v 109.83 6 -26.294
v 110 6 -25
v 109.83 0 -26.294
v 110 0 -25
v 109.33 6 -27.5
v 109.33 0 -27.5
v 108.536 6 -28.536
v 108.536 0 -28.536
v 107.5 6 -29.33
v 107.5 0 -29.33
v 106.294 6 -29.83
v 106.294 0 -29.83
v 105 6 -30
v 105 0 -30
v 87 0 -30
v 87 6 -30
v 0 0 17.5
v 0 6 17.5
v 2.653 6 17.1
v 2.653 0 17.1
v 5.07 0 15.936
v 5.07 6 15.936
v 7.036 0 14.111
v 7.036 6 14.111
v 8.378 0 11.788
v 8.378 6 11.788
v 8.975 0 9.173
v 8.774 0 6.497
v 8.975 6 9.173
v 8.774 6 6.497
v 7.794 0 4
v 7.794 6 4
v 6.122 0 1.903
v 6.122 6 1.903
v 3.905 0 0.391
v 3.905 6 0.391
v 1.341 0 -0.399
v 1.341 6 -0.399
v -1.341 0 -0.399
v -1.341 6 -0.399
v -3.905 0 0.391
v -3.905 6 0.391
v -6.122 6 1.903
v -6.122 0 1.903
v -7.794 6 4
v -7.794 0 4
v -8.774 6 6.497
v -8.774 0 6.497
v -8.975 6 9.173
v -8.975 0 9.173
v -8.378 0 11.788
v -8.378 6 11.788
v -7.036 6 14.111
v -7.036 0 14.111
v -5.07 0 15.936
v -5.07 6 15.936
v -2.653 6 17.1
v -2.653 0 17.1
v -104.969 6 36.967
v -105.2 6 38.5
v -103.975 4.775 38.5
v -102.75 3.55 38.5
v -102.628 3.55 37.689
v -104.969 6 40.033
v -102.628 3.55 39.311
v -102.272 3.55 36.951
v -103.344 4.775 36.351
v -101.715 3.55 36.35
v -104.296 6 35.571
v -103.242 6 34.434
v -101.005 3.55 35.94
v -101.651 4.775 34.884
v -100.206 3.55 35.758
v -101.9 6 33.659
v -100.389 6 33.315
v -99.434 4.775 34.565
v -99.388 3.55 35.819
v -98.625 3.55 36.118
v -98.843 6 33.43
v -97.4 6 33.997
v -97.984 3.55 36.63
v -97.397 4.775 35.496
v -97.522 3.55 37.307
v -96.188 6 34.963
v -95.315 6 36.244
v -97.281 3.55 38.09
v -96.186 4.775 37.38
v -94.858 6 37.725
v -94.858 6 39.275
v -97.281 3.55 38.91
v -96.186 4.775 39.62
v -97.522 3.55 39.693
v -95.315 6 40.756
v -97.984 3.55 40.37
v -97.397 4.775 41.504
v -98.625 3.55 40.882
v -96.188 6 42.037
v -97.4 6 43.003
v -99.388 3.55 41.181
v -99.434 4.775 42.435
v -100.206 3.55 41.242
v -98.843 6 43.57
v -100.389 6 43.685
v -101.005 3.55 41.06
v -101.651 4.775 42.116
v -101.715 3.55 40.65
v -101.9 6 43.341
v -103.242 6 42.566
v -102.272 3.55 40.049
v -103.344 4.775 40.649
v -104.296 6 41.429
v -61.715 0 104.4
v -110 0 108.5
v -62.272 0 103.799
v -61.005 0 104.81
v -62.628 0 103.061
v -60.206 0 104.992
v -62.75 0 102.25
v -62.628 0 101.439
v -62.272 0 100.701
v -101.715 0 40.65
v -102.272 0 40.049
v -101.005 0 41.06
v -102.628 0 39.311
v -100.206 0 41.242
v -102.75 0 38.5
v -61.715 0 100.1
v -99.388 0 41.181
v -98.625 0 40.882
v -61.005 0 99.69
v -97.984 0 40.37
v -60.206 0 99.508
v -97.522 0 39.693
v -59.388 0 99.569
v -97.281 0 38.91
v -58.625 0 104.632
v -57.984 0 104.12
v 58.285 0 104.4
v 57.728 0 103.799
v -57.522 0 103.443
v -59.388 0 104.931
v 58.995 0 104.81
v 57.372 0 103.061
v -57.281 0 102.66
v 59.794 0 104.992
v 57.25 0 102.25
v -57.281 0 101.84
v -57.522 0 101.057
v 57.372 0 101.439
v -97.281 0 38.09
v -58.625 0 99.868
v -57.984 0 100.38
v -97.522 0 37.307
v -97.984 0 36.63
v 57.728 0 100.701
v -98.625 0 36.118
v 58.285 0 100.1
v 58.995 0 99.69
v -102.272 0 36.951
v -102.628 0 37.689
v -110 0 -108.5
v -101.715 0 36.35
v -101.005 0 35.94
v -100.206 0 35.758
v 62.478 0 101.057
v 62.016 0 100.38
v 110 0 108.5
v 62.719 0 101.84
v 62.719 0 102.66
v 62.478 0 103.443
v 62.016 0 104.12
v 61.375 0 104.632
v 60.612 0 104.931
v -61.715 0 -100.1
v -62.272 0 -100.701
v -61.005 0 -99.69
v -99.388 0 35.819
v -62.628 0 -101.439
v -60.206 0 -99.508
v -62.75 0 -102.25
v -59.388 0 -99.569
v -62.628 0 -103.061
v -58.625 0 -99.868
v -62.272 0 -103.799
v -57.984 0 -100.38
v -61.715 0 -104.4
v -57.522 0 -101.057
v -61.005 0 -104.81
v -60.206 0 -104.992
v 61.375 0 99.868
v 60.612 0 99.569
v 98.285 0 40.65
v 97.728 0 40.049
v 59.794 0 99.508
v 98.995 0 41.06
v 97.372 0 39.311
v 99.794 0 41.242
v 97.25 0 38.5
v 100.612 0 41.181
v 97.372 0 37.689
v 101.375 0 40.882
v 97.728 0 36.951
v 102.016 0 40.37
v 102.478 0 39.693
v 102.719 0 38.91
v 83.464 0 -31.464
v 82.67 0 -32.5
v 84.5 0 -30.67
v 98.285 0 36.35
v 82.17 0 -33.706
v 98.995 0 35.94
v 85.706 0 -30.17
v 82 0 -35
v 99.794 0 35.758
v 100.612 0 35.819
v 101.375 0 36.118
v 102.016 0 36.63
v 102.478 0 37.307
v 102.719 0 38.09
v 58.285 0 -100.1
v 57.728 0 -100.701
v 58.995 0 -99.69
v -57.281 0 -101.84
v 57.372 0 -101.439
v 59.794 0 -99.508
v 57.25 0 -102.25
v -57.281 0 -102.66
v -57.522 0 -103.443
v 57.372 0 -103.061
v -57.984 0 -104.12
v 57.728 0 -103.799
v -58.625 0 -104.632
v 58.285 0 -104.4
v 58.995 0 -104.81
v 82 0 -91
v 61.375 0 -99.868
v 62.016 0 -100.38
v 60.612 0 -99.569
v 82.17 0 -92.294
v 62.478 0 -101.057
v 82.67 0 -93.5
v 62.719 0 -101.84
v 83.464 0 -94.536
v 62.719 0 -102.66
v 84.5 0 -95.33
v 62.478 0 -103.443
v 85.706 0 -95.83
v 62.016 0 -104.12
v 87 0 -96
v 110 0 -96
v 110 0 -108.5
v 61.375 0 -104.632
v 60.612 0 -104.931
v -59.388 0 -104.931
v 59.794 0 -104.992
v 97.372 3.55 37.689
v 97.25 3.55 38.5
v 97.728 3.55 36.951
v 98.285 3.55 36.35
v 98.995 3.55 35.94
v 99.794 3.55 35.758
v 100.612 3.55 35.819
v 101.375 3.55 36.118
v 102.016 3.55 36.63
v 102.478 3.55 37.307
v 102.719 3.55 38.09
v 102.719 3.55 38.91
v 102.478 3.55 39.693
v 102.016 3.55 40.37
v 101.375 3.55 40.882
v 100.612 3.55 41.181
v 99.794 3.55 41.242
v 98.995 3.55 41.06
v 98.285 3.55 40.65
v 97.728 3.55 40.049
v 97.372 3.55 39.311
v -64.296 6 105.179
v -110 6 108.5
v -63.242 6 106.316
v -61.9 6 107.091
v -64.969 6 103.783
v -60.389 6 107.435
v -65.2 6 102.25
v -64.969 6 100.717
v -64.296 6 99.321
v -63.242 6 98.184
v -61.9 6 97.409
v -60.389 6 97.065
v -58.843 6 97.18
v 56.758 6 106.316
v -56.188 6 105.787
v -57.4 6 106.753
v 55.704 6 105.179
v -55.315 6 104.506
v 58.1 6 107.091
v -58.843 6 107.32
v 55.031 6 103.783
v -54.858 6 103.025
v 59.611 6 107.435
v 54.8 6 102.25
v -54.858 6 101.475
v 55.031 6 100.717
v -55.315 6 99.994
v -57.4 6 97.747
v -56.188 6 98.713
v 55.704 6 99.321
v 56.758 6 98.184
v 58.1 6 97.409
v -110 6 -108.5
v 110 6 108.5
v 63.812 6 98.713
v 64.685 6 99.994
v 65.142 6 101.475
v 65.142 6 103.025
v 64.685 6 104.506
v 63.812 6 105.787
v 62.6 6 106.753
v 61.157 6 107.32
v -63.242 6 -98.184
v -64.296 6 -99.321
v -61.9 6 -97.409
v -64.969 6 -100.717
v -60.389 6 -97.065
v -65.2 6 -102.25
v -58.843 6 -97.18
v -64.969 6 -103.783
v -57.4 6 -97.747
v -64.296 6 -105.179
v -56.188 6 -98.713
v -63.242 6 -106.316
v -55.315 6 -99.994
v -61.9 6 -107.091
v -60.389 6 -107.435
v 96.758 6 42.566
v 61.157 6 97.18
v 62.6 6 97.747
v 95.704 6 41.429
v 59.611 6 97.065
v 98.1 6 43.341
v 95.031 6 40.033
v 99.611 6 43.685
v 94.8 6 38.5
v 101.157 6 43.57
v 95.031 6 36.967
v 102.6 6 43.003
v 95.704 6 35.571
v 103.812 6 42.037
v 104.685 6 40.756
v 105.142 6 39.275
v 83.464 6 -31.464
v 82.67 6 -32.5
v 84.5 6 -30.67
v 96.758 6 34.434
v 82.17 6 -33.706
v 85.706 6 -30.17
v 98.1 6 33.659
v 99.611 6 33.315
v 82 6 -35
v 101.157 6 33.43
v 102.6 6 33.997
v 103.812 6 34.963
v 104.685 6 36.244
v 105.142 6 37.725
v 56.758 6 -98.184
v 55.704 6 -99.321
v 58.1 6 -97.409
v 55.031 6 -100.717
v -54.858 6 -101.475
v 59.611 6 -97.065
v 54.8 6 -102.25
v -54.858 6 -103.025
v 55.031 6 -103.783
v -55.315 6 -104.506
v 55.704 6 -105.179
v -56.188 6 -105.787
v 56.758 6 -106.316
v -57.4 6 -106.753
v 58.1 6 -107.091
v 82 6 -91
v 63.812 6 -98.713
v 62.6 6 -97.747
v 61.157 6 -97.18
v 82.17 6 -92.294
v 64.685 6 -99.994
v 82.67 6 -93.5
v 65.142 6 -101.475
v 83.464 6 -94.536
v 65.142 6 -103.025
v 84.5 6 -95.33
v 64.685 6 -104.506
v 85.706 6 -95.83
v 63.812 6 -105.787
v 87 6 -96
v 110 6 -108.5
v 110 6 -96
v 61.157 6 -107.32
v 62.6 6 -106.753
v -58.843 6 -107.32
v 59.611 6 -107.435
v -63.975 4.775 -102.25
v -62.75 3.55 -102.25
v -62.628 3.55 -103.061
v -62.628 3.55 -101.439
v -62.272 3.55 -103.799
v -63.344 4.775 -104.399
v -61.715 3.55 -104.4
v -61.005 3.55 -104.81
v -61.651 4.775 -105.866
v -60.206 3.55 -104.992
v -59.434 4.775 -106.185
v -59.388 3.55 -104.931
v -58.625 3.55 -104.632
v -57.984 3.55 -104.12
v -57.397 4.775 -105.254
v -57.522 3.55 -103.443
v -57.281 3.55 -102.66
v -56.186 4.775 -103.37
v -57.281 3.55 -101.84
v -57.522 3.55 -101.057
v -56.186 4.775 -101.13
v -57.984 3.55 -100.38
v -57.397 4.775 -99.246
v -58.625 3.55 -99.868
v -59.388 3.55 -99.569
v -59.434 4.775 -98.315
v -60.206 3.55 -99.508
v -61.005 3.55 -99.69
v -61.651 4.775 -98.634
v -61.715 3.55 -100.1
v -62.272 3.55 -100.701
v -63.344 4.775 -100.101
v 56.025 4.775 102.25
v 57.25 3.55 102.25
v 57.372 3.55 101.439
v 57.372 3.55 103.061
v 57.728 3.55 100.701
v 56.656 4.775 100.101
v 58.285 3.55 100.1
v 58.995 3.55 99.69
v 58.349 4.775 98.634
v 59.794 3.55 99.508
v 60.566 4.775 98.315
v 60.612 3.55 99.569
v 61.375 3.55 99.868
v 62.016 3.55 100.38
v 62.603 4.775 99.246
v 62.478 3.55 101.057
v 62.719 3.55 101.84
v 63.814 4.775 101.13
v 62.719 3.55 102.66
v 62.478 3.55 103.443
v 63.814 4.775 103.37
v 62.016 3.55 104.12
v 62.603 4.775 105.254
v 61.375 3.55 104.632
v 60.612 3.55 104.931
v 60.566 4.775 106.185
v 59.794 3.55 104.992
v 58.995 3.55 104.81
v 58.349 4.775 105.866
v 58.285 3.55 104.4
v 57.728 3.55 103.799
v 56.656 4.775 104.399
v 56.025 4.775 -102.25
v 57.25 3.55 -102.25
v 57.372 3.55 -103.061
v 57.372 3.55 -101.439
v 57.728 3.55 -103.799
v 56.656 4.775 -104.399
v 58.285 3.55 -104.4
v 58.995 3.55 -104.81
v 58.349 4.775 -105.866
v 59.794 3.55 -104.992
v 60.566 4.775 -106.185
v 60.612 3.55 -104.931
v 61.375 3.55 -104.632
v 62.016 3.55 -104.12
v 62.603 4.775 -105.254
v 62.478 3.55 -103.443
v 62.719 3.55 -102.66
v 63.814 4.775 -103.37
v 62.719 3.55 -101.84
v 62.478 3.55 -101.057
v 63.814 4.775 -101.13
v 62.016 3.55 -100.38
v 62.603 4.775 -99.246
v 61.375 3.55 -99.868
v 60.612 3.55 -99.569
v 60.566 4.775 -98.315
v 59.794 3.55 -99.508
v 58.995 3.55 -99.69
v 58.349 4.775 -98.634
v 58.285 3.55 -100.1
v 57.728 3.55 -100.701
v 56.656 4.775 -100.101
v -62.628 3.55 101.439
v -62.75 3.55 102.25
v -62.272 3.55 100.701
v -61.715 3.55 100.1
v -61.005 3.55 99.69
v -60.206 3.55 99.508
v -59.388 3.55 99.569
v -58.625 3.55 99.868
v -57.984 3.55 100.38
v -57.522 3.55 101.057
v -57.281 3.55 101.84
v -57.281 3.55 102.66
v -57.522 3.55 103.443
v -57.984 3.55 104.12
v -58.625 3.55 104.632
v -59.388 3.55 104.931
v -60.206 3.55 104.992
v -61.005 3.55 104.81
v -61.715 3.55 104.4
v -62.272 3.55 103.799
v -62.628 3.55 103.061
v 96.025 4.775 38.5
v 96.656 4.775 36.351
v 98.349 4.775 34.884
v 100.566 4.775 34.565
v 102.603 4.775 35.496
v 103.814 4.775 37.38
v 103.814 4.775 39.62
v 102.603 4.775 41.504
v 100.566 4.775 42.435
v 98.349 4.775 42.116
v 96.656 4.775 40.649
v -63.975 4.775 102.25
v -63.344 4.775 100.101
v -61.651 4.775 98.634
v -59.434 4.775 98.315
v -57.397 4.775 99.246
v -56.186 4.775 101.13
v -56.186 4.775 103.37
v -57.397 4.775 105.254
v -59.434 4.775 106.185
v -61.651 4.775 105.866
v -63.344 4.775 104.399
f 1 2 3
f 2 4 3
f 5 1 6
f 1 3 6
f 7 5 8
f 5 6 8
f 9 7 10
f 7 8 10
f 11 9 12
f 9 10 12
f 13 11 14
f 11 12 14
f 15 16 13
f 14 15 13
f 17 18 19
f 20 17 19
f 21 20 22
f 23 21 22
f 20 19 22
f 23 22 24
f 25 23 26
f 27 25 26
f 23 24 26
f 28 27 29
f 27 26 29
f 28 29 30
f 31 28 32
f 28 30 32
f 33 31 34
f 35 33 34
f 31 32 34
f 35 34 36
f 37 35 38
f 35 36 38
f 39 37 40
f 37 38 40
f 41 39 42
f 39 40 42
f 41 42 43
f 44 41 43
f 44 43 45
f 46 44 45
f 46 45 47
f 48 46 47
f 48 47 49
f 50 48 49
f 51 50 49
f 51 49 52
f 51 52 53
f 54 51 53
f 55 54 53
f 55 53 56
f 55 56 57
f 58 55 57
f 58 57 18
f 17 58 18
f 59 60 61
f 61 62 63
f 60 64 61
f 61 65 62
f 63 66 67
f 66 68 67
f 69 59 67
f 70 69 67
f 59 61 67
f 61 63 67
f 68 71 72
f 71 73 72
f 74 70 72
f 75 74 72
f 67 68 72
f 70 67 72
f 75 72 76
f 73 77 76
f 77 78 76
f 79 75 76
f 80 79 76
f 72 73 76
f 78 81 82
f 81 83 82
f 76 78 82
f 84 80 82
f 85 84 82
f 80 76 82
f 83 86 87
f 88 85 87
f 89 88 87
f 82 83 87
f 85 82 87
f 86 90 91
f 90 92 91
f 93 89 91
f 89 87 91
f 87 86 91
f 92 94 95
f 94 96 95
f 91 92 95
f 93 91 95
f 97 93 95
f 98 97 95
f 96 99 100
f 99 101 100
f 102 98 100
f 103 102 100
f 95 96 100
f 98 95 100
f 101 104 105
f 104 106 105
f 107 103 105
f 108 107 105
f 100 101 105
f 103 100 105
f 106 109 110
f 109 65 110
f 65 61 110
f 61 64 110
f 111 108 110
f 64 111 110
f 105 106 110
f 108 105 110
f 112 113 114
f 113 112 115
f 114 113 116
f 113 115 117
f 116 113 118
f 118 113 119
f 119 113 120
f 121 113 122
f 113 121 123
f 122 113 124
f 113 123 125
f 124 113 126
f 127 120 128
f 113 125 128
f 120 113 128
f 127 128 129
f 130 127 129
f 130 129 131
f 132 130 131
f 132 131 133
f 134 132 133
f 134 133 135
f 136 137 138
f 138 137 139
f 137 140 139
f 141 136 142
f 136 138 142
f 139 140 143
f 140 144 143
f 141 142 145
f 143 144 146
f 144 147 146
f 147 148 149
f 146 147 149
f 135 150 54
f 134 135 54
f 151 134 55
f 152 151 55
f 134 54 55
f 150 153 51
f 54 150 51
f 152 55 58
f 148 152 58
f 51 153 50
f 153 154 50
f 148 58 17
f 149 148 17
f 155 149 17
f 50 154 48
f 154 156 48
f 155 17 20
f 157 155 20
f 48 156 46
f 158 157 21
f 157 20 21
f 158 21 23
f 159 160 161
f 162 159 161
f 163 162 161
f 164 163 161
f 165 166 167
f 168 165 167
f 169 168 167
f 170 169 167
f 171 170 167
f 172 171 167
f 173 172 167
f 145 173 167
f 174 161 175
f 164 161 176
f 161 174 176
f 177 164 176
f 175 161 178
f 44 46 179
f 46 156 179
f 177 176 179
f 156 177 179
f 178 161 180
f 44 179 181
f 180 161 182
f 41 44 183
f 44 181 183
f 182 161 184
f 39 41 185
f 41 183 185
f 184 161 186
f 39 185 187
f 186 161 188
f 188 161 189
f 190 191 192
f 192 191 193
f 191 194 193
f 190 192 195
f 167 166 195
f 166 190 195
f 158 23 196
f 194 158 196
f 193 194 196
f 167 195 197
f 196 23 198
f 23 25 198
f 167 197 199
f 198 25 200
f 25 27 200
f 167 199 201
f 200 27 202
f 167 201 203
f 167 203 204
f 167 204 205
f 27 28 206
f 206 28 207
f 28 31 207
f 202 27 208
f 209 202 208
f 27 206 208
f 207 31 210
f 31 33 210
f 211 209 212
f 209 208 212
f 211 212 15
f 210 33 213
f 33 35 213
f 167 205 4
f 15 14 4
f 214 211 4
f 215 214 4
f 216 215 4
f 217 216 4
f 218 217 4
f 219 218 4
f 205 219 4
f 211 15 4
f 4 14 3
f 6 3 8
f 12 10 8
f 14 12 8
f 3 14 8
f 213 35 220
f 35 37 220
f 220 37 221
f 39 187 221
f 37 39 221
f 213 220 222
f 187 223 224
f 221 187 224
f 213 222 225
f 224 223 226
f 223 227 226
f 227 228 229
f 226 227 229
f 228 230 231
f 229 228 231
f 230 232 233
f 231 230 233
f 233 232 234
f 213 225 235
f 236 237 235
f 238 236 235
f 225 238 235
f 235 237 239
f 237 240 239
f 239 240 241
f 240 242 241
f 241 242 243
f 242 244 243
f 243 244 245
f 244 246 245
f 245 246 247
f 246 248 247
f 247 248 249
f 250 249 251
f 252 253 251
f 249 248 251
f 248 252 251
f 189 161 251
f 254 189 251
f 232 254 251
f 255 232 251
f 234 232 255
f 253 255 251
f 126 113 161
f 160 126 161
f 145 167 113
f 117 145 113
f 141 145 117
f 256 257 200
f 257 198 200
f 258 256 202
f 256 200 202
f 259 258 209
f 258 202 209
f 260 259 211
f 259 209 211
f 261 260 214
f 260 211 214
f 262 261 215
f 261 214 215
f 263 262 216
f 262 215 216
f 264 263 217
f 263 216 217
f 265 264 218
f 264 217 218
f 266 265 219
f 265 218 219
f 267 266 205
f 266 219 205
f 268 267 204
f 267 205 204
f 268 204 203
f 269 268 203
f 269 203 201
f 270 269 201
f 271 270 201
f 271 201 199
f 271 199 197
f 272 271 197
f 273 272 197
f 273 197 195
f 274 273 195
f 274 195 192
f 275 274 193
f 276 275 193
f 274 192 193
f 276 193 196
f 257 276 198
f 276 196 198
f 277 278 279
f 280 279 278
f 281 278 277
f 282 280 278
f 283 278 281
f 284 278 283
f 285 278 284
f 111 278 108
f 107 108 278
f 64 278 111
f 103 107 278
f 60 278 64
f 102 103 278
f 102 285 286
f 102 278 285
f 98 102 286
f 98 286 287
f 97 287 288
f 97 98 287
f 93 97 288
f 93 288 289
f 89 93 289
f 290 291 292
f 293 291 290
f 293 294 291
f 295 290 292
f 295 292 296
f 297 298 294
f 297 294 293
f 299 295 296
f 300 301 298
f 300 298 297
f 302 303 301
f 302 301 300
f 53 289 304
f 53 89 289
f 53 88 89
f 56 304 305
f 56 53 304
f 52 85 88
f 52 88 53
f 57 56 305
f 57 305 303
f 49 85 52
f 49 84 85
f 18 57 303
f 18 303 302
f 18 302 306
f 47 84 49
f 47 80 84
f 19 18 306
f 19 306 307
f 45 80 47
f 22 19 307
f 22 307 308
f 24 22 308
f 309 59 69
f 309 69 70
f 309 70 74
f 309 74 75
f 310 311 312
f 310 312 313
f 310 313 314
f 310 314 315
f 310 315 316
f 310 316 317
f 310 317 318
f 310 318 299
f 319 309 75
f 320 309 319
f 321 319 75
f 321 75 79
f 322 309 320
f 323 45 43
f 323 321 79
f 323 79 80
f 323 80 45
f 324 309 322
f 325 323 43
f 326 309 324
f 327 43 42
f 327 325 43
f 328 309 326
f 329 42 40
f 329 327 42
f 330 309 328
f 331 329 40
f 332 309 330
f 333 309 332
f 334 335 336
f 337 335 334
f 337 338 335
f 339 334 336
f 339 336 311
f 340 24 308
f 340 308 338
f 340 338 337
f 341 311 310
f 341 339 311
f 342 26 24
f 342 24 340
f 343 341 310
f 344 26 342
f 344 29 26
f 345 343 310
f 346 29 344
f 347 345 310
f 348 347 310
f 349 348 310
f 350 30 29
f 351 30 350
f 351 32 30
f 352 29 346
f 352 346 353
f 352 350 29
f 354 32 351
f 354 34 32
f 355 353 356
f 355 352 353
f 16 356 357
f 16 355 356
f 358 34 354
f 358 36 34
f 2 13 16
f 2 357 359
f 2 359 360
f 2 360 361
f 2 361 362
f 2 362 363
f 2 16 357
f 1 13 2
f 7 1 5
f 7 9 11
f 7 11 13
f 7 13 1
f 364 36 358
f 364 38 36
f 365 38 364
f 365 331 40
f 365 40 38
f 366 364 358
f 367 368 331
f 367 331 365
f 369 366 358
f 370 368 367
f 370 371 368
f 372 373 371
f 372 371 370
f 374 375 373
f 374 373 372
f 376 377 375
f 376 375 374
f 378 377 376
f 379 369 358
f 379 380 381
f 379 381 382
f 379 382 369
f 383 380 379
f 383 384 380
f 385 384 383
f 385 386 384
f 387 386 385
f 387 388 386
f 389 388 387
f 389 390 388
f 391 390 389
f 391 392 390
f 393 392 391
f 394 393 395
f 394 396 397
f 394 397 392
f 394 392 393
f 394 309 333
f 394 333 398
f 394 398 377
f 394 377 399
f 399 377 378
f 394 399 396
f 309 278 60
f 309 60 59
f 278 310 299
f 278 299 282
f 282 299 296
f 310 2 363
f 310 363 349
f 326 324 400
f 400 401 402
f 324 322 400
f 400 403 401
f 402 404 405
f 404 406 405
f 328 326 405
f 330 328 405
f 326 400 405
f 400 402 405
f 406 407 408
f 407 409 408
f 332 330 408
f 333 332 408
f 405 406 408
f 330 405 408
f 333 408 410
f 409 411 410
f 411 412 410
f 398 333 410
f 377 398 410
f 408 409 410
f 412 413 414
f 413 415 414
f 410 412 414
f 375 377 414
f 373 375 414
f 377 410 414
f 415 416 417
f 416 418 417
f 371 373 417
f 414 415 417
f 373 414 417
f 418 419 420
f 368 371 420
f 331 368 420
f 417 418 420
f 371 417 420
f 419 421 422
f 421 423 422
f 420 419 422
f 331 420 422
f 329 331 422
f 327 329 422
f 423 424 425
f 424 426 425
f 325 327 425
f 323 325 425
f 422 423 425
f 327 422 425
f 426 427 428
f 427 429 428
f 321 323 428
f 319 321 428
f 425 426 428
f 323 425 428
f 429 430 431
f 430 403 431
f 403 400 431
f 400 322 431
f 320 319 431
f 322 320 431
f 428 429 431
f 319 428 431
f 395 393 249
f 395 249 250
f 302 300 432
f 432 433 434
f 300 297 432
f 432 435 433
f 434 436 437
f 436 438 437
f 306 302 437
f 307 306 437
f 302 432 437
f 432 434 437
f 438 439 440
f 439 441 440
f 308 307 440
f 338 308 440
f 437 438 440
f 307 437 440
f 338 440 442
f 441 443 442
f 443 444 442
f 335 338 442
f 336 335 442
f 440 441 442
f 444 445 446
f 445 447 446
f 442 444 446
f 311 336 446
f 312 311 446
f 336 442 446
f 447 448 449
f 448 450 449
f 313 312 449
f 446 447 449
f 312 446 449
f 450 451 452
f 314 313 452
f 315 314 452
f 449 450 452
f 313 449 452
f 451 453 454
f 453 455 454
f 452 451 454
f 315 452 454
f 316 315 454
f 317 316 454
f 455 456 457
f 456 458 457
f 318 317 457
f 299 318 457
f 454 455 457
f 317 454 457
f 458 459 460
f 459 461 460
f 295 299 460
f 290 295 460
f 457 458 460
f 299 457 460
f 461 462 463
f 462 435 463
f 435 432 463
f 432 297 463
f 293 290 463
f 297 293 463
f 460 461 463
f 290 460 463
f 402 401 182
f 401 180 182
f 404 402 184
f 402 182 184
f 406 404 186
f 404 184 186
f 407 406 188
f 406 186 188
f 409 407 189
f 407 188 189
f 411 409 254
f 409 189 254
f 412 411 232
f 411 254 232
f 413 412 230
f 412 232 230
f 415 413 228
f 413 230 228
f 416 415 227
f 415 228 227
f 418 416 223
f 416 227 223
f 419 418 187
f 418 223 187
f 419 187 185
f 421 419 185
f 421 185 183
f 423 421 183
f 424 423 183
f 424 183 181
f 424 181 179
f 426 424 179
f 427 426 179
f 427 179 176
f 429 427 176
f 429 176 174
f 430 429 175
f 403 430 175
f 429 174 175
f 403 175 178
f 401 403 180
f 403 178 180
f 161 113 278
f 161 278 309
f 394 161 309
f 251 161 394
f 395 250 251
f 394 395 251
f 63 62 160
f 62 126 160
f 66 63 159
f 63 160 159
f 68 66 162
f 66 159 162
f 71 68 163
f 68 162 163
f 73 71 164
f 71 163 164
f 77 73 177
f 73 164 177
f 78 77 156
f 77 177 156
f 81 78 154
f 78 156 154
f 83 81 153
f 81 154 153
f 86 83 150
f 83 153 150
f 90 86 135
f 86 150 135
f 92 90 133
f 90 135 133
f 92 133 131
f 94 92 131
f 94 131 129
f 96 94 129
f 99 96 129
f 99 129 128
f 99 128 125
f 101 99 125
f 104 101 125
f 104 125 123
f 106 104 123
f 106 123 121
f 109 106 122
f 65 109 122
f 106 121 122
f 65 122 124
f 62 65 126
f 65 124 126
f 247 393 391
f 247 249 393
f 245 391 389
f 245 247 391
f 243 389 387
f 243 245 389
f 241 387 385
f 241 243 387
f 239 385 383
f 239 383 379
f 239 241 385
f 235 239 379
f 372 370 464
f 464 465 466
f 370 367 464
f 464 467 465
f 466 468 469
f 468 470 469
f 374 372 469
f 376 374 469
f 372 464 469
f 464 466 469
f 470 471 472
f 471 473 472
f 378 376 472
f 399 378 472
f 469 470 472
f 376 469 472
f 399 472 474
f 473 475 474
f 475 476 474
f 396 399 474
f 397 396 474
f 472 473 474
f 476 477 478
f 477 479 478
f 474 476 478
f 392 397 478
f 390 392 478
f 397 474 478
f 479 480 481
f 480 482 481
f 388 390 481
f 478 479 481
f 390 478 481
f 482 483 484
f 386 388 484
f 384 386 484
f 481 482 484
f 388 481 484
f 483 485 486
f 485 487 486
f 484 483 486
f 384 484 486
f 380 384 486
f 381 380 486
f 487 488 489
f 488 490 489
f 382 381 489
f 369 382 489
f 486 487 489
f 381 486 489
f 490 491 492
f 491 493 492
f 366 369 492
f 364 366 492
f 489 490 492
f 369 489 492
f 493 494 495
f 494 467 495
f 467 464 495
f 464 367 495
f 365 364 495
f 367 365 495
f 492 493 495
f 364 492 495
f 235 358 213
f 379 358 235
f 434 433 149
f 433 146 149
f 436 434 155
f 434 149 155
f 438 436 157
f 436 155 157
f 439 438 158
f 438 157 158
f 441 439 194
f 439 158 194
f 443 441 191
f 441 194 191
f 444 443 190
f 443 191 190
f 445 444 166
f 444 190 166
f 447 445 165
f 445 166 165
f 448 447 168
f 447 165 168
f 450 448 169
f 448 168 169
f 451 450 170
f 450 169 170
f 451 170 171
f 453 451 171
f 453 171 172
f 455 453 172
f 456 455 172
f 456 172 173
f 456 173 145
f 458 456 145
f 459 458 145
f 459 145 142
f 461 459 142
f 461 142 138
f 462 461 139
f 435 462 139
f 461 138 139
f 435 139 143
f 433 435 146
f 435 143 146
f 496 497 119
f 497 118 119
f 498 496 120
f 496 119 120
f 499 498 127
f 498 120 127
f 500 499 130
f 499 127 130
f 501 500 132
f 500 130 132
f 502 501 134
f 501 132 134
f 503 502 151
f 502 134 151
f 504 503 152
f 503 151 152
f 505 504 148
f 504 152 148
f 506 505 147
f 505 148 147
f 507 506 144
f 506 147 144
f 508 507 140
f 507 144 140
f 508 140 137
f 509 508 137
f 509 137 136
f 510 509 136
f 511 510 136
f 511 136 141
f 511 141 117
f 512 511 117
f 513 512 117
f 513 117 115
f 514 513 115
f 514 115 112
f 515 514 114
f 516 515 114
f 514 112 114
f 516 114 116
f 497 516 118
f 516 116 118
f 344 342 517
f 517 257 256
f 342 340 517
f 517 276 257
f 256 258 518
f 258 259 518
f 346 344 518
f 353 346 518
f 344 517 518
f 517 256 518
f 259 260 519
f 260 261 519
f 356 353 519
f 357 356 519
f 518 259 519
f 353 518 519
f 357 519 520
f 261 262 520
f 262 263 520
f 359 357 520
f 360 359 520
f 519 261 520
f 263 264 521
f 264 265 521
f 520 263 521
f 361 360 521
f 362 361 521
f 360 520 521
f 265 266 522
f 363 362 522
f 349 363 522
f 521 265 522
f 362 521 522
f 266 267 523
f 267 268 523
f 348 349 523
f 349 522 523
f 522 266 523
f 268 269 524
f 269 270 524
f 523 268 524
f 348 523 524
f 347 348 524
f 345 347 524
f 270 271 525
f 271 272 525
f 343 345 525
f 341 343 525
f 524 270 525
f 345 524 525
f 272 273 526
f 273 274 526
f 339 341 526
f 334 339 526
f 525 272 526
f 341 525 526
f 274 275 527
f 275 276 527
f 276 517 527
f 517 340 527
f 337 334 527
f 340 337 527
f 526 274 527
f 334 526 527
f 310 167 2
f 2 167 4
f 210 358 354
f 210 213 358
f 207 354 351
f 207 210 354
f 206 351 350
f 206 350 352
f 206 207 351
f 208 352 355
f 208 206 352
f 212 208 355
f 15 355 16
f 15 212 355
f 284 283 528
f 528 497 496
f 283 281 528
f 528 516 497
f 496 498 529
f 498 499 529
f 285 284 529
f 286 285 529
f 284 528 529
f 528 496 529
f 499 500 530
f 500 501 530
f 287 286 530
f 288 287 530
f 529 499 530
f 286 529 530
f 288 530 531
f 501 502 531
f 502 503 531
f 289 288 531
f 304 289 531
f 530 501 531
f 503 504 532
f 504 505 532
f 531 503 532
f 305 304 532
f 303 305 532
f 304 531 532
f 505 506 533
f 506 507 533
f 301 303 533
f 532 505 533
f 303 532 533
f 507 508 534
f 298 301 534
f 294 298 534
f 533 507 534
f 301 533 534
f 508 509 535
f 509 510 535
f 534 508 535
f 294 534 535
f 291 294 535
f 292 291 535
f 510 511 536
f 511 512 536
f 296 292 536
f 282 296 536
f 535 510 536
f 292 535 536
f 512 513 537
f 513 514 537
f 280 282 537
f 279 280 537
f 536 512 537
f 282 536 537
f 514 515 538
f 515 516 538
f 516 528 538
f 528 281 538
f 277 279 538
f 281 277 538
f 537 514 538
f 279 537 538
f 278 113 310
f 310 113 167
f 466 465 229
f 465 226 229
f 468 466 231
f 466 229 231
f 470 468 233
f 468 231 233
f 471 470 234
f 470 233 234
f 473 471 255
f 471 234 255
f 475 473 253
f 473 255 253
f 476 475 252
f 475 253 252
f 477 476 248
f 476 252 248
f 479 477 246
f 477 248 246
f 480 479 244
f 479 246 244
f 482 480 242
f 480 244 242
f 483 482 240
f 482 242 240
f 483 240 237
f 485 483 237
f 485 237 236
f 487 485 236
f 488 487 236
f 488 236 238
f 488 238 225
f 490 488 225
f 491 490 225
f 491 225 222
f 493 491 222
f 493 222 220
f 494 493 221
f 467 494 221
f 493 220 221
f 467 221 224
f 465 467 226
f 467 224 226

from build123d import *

# Parameters (mm, degrees)
SKETCH1_W                                = 220
SKETCH1_H                                = 217
BLOCO_DEPTH                              = 6
SKETCH2_R                                = 9
SKETCH2_W                                = 28
SKETCH2_H                                = 66
CORTE_MOTOR_DEPTH                        = 155.622928442
RAIOS_5MM_R                              = 5
FUROS_ESCAREADOS_M5_PASSANTE_D           = 5.5
FUROS_ESCAREADOS_M5_PASSANTE_CSINK_D     = 10.4
FUROS_ESCAREADOS_M5_PASSANTE_CSINK_ANGLE = 90


with BuildPart() as part:
    # Sketch1 → Bloco (new body)
    with BuildSketch(Plane(origin=(0, 0, 0), x_dir=(1, 0, 0), z_dir=(0, 1, 0))):
        Rectangle(SKETCH1_W, SKETCH1_H)
    extrude(amount=BLOCO_DEPTH)

    # Sketch2 → Corte Motor (cut, through all)
    with BuildSketch(Plane(origin=(0, 6, 0), x_dir=(1, 0, 0), z_dir=(0, 1, 0))):
        with Locations(Location((0, -8.5, 0), (0, 0, 270))):
            Circle(SKETCH2_R)
        with Locations((96, 63)):
            Rectangle(SKETCH2_W, SKETCH2_H)
    extrude(amount=-CORTE_MOTOR_DEPTH, mode=Mode.SUBTRACT)

    # Raios 5mm
    raios_5mm_edges = [part.edges().sort_by_distance(p)[0] for p in [
        (82, 3, -30),
        (82, 3, -96),
        (110, 3, -30),
    ]]
    fillet(raios_5mm_edges, radius=RAIOS_5MM_R)

    # Furos Escareados - M5 Passante (through all)
    with Locations(Plane(origin=(0, 6, 0), x_dir=(1, 0, 0), z_dir=(0, 1, 0))):
        with Locations((-100, -38.5), (-60, -102.25), (60, -102.25), (100, -38.5), (-60, 102.25), (60, 102.25)):
            CounterSinkHole(FUROS_ESCAREADOS_M5_PASSANTE_D / 2, FUROS_ESCAREADOS_M5_PASSANTE_CSINK_D / 2, counter_sink_angle=FUROS_ESCAREADOS_M5_PASSANTE_CSINK_ANGLE)


solid = part.part
